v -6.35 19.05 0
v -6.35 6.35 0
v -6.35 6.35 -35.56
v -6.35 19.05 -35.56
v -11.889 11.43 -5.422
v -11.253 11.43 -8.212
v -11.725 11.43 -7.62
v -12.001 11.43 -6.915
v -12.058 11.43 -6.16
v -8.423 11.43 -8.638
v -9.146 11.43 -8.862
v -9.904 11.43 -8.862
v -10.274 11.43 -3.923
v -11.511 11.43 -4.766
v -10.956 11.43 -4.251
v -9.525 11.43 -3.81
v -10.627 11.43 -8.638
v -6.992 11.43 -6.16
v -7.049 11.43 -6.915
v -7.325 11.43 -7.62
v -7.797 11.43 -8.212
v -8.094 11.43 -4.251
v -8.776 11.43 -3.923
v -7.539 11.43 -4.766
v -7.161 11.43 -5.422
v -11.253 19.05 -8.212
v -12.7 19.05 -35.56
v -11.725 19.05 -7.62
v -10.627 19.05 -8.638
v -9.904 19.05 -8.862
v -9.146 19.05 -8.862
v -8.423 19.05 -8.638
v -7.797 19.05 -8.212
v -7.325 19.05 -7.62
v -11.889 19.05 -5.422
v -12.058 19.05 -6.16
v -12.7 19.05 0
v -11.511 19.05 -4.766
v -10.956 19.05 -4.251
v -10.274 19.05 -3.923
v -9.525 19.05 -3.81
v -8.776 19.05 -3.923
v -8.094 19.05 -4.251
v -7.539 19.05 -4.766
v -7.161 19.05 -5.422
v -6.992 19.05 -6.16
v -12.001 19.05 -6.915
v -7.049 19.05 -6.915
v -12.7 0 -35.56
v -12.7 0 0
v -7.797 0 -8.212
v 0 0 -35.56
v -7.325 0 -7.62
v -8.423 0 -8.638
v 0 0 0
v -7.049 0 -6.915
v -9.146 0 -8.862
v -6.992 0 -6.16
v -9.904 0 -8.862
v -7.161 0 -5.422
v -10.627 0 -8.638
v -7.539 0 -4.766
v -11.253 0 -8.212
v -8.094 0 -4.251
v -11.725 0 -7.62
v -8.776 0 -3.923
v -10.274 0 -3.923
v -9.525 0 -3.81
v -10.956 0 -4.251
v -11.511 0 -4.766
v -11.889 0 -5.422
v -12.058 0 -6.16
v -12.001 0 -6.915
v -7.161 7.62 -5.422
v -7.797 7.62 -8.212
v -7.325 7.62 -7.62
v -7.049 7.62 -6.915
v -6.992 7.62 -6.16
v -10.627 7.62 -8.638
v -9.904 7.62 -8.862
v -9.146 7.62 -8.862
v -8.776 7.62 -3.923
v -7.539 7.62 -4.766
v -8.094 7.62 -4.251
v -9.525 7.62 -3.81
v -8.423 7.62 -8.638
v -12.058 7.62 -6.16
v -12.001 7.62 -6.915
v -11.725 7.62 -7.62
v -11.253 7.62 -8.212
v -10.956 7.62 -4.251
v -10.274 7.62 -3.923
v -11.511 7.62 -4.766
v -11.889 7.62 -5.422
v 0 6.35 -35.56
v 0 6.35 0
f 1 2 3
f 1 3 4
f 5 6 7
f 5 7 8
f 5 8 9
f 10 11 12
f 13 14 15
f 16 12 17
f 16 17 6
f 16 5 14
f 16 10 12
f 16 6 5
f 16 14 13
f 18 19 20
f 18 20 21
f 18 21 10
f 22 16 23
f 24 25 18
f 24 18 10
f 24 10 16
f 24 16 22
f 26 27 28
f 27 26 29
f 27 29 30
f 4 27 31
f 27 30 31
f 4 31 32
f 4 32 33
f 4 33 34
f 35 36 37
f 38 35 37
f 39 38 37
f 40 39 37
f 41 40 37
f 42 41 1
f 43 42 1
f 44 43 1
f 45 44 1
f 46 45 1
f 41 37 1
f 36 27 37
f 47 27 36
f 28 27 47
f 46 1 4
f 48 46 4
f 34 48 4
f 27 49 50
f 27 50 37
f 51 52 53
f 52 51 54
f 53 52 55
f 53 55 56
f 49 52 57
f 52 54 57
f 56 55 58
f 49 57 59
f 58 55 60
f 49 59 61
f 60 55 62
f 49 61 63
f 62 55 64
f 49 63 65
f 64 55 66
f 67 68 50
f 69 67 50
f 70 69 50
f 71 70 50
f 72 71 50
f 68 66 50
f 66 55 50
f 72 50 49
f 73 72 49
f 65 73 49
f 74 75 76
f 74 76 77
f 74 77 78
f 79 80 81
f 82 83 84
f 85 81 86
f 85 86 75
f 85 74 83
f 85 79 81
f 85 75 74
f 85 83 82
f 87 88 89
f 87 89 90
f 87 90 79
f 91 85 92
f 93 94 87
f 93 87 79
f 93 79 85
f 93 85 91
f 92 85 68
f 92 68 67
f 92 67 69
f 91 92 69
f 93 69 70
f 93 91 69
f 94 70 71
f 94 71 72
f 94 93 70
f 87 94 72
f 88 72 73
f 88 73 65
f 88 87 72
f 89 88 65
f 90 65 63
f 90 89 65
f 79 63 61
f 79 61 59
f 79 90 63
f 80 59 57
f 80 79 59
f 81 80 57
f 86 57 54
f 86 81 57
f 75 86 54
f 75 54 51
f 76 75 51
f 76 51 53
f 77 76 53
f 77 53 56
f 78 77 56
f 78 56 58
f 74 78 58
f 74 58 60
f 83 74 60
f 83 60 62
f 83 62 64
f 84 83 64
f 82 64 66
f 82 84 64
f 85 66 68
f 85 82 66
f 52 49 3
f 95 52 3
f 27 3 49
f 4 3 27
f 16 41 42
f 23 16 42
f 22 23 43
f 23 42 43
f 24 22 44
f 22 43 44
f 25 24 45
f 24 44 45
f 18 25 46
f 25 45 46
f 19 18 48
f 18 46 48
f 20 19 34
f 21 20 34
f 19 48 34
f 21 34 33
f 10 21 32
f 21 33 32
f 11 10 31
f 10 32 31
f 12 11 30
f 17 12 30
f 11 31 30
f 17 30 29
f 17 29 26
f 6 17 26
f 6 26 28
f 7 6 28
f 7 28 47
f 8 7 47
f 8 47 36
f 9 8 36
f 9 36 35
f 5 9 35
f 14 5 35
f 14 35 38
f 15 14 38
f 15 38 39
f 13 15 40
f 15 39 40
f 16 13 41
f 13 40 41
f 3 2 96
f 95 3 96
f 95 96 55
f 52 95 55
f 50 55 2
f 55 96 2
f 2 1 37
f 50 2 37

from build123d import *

# Parameters (mm, degrees)
BOSS_EXTRUDE1_DEPTH = 381
CUT_EXTRUDE1_REACH  = 383.687
SKETCH2_R           = 3.175
SKETCH3_R           = 2.54
CUT_EXTRUDE2_DEPTH  = 7.62
CUT_EXTRUDE3_START  = -7.62
SKETCH4_R           = 2.54
CUT_EXTRUDE3_DEPTH  = 7.62
SKETCH5_W           = 6.35
SKETCH5_H           = 6.35
CUT_EXTRUDE4_DEPTH  = 345.44
SKETCH7_W           = 345.44
SKETCH7_H           = 19.05
CUT_EXTRUDE5_DEPTH  = 382.528799699


with BuildPart() as part:
    # Sketch1 → Boss-Extrude1 (new body)
    with BuildSketch(Plane.XY):
        Polygon((0, 0), (-12.7, 0), (-12.7, 19.05), (-6.35, 19.05), (-6.35, 6.35), (0, 6.35), align=None)
    extrude(amount=-BOSS_EXTRUDE1_DEPTH)

    # Sketch2 → Cut-Extrude1 (cut, up to next)
    with BuildSketch(Plane.ZY.offset(12.7), mode=Mode.PRIVATE) as cut_extrude1_sk1:
        with Locations(Location((-365.76, 12.065, 0), (0, 0, 270))):
            Circle(SKETCH2_R)
    cut_extrude1_tool1 = extrude(cut_extrude1_sk1.sketch, amount=-CUT_EXTRUDE1_REACH, mode=Mode.PRIVATE) & part.part
    add(cut_extrude1_tool1.solids().sort_by_distance((-12.7, 12.065, -365.76))[0], mode=Mode.SUBTRACT)

    # Sketch3 → Cut-Extrude2 (cut)
    with BuildSketch(Plane(origin=(0, 19.05, 0), x_dir=(1, 0, 0), z_dir=(0, 1, 0))):
        with Locations(Location((-9.525, 6.35, 0), (0, 0, 270))):
            Circle(SKETCH3_R)
        with Locations(Location((-9.525, 374.65, 0), (0, 0, 270))):
            Circle(SKETCH3_R)
    extrude(amount=-CUT_EXTRUDE2_DEPTH, mode=Mode.SUBTRACT)

    # Sketch4 → Cut-Extrude3 (cut)
    with BuildSketch(Plane.XZ.offset(CUT_EXTRUDE3_START)):
        with Locations(Location((-9.525, -374.65, 0), (0, 0, 90))):
            Circle(SKETCH4_R)
        with Locations(Location((-9.525, -6.35, 0), (0, 0, 90))):
            Circle(SKETCH4_R)
    extrude(amount=CUT_EXTRUDE3_DEPTH, mode=Mode.SUBTRACT)

    # Sketch5 → Cut-Extrude4 (cut)
    with BuildSketch(Plane(origin=(0, 0, -381), x_dir=(-1, 0, 0), z_dir=(0, 0, -1))):
        with Locations((3.175, 3.175)):
            Rectangle(SKETCH5_W, SKETCH5_H)
    extrude(amount=-CUT_EXTRUDE4_DEPTH, mode=Mode.SUBTRACT)

    # Sketch7 → Cut-Extrude5 (cut, through all)
    with BuildSketch(Plane(origin=(-6.35, 0, 0), x_dir=(0, 0, -1), z_dir=(1, 0, 0))):
        with Locations((208.28, 9.525)):
            Rectangle(SKETCH7_W, SKETCH7_H)
    extrude(amount=-CUT_EXTRUDE5_DEPTH, mode=Mode.SUBTRACT)


solid = part.part
